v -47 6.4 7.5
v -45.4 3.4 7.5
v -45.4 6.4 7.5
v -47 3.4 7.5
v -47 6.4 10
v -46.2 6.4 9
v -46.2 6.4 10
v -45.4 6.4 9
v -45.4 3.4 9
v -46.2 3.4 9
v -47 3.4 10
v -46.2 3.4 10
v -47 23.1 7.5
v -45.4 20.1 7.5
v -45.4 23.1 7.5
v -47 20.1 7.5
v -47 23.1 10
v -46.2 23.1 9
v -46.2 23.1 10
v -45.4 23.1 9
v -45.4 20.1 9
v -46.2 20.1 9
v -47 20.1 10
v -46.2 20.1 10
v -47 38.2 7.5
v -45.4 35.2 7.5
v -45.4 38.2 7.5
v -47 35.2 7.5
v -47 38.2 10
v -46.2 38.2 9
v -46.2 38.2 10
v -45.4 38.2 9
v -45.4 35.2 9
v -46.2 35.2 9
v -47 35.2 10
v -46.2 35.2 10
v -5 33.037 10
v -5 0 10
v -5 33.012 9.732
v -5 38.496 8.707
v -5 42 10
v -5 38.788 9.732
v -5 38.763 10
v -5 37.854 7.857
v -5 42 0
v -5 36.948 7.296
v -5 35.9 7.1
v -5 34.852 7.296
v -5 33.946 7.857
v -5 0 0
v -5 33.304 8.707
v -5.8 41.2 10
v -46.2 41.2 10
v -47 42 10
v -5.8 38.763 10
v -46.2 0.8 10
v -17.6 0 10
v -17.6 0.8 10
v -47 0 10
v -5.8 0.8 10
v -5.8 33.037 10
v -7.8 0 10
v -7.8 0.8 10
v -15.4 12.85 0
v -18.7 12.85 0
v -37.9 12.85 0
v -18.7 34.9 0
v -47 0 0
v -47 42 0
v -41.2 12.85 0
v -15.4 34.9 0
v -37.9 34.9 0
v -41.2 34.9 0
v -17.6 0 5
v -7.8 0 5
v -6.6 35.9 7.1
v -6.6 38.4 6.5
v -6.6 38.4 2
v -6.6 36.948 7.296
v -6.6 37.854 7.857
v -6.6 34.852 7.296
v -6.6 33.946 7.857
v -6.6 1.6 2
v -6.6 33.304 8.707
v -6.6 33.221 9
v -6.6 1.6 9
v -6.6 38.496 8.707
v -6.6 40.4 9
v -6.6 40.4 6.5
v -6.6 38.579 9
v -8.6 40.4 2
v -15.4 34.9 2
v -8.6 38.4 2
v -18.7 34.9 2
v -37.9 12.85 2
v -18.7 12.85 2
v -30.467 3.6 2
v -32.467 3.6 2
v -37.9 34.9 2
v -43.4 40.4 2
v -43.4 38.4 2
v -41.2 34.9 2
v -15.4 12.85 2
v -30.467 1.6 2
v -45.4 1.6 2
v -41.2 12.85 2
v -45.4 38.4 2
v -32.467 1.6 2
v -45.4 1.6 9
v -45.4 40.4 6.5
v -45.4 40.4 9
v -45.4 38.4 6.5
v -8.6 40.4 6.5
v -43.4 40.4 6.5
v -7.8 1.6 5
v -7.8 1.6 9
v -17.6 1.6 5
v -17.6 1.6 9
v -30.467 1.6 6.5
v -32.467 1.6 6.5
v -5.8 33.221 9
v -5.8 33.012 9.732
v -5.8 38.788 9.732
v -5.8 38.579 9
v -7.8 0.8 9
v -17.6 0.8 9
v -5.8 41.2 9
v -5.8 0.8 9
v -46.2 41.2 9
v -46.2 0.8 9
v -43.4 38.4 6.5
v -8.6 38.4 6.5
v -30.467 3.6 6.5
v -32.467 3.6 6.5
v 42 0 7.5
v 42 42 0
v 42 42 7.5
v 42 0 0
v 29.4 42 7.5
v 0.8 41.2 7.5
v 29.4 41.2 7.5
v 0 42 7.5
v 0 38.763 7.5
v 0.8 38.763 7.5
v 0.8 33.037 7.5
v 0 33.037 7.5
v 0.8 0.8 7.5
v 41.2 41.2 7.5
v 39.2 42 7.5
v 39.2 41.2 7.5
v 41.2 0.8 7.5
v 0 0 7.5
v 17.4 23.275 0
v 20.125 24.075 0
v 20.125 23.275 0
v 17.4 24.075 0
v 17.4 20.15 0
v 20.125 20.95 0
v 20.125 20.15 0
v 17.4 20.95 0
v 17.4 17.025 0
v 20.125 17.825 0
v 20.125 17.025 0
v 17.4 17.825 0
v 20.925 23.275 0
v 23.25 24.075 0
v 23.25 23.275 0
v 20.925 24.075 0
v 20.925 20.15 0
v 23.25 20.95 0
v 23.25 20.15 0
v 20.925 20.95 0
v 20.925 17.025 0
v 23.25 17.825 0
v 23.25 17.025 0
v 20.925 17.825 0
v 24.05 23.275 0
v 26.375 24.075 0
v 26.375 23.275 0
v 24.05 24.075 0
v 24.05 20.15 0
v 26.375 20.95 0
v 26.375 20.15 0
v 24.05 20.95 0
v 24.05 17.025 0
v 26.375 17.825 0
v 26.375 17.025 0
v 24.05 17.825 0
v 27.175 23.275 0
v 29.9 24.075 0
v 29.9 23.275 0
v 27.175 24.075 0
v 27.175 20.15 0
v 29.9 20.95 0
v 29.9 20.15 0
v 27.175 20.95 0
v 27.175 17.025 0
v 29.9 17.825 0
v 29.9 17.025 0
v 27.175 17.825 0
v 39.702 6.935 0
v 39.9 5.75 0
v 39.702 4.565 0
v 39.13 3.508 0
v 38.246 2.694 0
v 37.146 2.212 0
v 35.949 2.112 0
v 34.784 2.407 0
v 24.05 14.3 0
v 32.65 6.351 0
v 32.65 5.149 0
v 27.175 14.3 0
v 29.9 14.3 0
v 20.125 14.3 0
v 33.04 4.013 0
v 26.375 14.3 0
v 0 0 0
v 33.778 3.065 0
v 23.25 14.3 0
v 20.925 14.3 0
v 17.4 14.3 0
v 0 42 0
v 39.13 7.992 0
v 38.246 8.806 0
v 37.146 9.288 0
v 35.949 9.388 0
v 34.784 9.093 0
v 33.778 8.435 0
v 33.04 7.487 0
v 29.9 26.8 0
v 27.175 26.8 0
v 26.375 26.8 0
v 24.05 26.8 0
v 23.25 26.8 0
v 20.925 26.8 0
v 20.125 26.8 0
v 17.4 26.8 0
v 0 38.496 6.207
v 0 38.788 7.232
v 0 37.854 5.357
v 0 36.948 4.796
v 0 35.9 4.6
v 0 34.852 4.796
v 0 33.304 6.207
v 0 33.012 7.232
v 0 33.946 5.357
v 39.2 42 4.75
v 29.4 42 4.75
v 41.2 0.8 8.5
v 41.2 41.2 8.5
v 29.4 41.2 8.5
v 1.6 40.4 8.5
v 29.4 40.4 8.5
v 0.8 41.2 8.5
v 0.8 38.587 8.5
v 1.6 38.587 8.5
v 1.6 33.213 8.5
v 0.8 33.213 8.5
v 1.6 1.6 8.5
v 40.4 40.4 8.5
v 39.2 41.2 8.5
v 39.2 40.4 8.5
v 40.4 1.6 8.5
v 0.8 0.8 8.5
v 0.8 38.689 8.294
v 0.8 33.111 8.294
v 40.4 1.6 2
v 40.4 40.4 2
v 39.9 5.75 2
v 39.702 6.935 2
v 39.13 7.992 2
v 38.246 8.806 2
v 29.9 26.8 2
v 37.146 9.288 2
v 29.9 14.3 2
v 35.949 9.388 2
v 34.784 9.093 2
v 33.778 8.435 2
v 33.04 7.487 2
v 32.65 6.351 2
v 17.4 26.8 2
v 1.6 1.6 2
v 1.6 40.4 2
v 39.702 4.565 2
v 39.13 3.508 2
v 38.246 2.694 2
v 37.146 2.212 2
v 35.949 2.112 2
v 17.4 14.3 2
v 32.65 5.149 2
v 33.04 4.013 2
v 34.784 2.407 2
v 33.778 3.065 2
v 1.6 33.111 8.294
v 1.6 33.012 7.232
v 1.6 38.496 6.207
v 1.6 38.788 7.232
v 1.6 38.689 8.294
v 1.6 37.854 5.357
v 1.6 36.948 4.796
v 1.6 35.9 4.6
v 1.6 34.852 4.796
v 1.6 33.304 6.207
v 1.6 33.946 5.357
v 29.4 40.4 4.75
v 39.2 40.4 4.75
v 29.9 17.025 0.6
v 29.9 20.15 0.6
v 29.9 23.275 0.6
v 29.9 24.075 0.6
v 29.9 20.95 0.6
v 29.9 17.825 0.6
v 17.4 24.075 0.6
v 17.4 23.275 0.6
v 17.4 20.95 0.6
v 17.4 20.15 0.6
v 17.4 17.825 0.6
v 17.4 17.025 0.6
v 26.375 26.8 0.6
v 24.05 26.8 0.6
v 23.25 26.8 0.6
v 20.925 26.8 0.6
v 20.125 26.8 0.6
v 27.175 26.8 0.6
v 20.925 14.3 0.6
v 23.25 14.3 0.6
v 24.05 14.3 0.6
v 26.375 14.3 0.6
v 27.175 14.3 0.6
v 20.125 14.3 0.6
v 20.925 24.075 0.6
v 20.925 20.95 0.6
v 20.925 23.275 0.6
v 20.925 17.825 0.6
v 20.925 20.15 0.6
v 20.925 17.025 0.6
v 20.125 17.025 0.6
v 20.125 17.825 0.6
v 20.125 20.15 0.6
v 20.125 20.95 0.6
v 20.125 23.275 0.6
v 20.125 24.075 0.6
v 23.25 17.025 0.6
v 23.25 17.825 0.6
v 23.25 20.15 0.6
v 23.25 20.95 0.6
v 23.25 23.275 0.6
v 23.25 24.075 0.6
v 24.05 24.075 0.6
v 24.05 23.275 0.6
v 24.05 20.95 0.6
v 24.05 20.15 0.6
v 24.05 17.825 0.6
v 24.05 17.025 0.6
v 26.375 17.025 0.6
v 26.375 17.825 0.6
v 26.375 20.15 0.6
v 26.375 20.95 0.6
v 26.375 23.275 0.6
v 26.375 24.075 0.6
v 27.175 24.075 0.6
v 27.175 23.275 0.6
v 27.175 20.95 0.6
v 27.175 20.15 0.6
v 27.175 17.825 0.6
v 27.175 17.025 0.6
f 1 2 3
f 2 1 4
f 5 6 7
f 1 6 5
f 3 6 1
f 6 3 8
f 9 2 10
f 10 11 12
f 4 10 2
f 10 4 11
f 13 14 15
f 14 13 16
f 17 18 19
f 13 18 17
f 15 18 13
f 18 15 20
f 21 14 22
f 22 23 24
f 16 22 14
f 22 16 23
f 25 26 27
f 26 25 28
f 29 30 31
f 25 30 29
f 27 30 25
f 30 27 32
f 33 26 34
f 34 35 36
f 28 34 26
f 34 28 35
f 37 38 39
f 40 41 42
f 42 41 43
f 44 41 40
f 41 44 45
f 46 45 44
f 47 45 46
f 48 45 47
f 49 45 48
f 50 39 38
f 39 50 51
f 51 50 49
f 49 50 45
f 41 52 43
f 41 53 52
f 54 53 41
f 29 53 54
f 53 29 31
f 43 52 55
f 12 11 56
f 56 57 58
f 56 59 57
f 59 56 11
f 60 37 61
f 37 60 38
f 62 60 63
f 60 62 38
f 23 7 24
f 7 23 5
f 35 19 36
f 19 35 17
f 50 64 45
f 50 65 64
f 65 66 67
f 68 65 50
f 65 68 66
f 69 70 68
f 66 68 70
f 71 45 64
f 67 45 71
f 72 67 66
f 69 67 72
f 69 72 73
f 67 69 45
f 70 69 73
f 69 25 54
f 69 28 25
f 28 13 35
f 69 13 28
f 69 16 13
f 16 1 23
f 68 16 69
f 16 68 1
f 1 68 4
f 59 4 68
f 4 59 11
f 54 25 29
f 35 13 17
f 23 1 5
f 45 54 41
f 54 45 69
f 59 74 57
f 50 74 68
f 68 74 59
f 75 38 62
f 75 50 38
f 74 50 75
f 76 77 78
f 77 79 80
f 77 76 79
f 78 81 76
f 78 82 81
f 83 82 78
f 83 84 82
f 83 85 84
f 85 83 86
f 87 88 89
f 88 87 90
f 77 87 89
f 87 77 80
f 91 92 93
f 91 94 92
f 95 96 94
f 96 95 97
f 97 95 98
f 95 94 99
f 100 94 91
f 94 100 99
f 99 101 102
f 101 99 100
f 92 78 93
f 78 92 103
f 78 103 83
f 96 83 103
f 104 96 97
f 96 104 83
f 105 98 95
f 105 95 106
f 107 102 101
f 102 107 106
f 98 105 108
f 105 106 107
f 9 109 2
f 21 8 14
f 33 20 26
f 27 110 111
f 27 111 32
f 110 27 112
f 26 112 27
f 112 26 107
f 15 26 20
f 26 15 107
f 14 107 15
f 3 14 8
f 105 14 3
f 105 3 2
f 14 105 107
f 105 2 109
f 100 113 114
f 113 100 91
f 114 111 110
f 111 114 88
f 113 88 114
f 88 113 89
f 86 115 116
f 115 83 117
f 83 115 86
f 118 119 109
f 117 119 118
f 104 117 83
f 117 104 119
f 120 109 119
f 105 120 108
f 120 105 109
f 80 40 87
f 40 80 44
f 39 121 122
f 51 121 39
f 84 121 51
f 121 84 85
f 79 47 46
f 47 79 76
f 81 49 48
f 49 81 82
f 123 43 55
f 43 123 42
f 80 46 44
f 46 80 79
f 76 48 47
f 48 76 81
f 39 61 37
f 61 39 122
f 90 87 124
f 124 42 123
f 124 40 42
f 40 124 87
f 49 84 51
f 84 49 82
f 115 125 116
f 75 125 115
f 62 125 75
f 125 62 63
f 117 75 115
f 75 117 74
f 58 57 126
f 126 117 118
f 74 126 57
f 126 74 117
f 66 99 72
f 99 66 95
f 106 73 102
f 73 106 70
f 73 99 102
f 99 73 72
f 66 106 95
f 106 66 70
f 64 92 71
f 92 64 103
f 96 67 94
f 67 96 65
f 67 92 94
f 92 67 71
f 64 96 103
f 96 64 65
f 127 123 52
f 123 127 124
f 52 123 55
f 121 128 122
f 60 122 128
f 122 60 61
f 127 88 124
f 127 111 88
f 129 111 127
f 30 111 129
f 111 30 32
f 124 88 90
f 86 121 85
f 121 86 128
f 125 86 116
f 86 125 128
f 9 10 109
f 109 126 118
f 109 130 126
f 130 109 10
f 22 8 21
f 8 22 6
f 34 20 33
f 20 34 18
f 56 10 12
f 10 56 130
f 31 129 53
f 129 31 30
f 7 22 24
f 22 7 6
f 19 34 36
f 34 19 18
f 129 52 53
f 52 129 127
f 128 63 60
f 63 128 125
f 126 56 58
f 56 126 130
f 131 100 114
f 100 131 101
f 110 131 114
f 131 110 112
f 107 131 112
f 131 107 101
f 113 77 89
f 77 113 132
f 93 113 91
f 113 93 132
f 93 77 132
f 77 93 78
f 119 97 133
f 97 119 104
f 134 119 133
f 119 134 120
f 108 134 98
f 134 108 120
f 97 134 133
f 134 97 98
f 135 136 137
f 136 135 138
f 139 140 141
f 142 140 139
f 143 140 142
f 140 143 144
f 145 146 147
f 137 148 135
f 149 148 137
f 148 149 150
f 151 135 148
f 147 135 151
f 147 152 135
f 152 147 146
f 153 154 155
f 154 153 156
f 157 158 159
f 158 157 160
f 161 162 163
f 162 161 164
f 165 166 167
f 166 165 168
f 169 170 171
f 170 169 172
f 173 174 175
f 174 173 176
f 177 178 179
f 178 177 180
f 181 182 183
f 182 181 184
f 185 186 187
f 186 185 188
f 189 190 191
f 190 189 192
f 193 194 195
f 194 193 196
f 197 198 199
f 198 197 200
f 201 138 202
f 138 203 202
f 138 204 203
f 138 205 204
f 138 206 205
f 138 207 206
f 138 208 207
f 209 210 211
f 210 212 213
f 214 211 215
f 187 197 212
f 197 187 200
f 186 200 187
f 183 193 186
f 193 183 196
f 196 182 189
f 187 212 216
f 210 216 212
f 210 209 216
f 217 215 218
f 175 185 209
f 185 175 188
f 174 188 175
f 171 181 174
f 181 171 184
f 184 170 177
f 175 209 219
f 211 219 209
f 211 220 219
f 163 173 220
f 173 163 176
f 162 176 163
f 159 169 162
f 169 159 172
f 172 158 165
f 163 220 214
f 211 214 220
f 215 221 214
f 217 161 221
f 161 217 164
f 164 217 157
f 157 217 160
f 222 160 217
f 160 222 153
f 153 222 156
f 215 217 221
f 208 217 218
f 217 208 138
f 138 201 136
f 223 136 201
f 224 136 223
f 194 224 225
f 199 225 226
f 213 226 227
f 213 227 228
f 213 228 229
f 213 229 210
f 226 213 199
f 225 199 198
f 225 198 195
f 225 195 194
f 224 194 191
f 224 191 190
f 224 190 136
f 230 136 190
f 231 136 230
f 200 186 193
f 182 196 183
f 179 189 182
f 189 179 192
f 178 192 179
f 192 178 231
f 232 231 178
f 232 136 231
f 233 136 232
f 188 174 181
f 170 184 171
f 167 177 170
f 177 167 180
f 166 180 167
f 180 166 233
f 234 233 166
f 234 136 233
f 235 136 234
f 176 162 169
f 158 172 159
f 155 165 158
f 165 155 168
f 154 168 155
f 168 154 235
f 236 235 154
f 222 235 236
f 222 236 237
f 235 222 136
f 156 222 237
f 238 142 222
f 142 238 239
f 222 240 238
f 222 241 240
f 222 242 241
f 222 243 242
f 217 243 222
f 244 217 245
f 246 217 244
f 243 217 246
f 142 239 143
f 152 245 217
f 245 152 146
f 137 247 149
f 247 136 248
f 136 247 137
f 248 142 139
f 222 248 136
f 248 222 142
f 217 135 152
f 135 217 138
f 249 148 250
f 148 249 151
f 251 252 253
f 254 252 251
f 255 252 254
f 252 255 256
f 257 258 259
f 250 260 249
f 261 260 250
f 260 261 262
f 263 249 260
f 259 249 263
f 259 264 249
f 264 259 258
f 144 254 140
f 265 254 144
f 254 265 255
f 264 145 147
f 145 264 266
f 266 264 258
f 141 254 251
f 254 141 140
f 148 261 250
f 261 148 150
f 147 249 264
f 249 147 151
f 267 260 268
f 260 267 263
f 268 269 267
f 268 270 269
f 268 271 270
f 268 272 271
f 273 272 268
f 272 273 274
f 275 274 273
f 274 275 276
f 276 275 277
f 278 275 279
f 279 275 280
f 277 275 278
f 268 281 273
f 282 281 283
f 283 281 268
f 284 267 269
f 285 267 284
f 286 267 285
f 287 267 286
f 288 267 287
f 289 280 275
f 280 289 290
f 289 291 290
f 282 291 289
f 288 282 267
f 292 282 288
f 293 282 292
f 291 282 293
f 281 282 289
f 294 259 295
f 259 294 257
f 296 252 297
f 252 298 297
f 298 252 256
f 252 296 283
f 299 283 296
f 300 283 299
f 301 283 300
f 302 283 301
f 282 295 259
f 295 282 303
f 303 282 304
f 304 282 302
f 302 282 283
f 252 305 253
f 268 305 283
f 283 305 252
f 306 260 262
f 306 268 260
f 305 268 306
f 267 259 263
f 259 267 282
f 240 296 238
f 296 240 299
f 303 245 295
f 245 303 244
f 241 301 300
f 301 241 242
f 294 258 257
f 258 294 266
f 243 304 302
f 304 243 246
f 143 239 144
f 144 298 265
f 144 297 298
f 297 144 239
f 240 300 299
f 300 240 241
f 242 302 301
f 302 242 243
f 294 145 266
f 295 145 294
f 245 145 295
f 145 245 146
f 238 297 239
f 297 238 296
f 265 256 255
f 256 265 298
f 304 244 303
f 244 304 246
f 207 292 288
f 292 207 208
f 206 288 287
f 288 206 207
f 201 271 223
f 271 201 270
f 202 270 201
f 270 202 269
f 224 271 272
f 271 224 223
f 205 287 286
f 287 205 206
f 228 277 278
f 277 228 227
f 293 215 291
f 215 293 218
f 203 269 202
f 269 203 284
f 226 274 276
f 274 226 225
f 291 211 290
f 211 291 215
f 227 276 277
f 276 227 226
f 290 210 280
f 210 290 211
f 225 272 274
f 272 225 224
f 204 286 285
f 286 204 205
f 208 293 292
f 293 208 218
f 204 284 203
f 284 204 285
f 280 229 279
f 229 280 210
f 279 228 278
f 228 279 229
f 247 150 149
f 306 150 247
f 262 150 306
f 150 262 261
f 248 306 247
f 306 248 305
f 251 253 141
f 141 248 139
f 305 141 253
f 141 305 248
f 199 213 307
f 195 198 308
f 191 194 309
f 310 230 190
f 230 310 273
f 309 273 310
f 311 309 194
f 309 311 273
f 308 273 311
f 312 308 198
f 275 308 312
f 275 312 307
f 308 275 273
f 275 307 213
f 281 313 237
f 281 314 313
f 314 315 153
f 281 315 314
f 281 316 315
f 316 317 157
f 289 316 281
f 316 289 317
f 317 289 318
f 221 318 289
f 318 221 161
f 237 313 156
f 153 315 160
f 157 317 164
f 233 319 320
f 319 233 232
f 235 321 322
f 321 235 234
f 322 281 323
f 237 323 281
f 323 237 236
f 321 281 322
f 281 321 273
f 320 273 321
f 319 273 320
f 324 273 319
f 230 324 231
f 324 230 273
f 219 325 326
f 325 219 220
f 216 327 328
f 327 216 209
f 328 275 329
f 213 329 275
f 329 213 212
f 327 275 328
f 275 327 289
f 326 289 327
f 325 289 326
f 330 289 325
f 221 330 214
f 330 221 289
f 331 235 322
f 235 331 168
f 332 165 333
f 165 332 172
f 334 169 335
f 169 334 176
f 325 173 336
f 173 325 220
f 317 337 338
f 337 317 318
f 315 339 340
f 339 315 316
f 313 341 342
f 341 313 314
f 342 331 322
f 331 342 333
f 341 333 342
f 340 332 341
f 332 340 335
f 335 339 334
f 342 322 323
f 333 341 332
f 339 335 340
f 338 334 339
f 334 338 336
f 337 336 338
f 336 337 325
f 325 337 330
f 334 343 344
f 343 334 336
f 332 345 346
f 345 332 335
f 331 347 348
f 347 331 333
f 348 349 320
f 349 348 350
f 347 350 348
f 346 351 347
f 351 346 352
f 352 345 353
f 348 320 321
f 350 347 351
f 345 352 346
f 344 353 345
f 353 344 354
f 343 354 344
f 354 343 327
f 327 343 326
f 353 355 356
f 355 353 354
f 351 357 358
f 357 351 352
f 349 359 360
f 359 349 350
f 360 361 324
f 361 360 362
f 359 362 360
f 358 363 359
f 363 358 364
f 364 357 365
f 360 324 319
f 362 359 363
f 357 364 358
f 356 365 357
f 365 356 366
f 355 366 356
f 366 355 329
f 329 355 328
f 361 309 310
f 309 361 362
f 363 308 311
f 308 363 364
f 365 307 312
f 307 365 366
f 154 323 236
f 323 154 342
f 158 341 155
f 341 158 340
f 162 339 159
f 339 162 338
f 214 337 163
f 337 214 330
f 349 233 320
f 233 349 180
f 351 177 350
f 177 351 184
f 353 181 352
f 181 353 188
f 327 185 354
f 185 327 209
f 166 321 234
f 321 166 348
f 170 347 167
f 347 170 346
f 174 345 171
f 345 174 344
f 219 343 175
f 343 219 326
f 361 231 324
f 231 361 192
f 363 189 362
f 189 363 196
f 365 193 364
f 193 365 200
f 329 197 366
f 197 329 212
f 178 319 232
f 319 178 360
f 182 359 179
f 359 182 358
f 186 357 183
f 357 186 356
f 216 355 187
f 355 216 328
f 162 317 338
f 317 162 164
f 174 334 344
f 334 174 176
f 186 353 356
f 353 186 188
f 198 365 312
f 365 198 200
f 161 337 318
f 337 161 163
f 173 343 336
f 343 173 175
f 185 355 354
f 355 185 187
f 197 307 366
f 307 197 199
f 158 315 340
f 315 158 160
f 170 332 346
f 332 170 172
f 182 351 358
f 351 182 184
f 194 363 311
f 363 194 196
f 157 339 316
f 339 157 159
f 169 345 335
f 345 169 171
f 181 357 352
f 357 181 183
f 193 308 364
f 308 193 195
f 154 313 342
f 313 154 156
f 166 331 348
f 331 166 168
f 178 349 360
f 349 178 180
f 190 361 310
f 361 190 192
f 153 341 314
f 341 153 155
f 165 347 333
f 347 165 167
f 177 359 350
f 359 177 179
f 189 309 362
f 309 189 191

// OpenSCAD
coverWidth=42;
coverHeight=42;
coverDepth=10;
caseDepth=7.5;

coverBoardWidth=38.8;
coverBoardHeight=38.8;
coverBoardDepth=8;
caseBoardDepth=5.5;
floatStickDepth = 3.5;

powerHoleR = 2.9;
powerHoleShift = 4.5;

usbHoleHeight = 3.8;
usbHoleWidth= 9.8;
usbHoleShift = 11;
usbHoleZShift = 5;
usbCaseHoleShift = 11;
usbCaseHoleZShift = 2.75;

buttonHoleWidth = 3.0;
buttonHoleHeight = 2.0;
buttonHoleShift = [1.8, 18.5, 33.6];
buttonHoleZShift = 2.5;

mikroBUSHeight = 22.05;
mikroBUSWidth = 3.3;
mikroBUSXShift = 4.2;
mikroBUSXShiftAdd = 22.5;
mikroBUSYShift = 5.5;

cameraHoleR = 3.65;
cameraHoleXShift=0.5;
cameraHoleYShift=0.5;

cpuHoleWidth = 12.5;
cpuHoleHeight = 12.5;
cpuHoleX = 10.5;
cpuHoleY = 12.7;

part = "both"; // [cover:cover only,case:case only,both:cover and case]

module obj0x01 () {
}

caseWidth = coverWidth;
caseHeight = coverHeight;
caseBoardWidth = coverBoardWidth;
caseBoardHeight = coverBoardHeight;
usbHoleZShiftLeft = max(coverDepth-usbHoleZShift-usbHoleHeight, 0);
buttonHoleZShiftLeft = max(coverDepth-buttonHoleZShift-buttonHoleHeight, 0);

module cover() {
    union() {
        difference() {
            cube([coverWidth,coverHeight,coverDepth]);
            translate([(coverWidth-coverBoardWidth)/2, (coverHeight-coverBoardHeight)/2, coverDepth-coverBoardDepth]) {
                cube([coverBoardWidth, coverBoardHeight, coverBoardDepth+1]);
            }
            // power hole
            translate([(coverWidth-coverBoardWidth)/2+coverBoardWidth-1, (coverHeight-coverBoardHeight)/2+coverBoardHeight-powerHoleShift, coverDepth]) {
                rotate([0,90,0]) {
                    cylinder(r=powerHoleR, h=(coverWidth-coverBoardWidth)/2+2, $fn=getFN(powerHoleR));
                }
            }
            // usb
            translate([(coverWidth-coverBoardWidth)/2+coverBoardWidth-usbHoleShift,-1,coverDepth-usbHoleZShift]) {
                cube([usbHoleWidth, coverHeight-coverBoardHeight+2, usbHoleHeight+usbHoleZShiftLeft+1]);
            }
            // buttons
            for (i = buttonHoleShift) {
                translate([-1, (coverHeight-coverBoardHeight)/2+i, coverDepth-buttonHoleZShift]) {
                    cube([(coverWidth-coverBoardWidth)/2+2,buttonHoleWidth, buttonHoleHeight+buttonHoleZShiftLeft+1]);
                }
            }
            // mikroBUS
            translate([(coverWidth-coverBoardWidth)/2+mikroBUSXShift, (coverHeight-coverBoardHeight)/2+coverBoardHeight-mikroBUSHeight-mikroBUSYShift, -1]) {
                cube([mikroBUSWidth,mikroBUSHeight, coverDepth-coverBoardDepth+2]);
            }
            translate([(coverWidth-coverBoardWidth)/2+mikroBUSXShift+mikroBUSXShiftAdd, (coverHeight-coverBoardHeight)/2+coverBoardHeight-mikroBUSHeight-mikroBUSYShift, -1]) {
                cube([mikroBUSWidth,mikroBUSHeight, coverDepth-coverBoardDepth+2]);
            }
            // latch
            translate([(coverWidth-coverBoardWidth)/4,(coverHeight-coverBoardHeight)/4,coverDepth-1]) {
                cube([(coverWidth+coverBoardWidth)/2, (coverHeight+coverBoardHeight)/2, 1+1]);
            }
        }
        translate([(coverWidth-coverBoardWidth)/2, (coverHeight-coverBoardHeight)/2+coverBoardHeight-2, 0]) {
            cube([2,2,coverDepth-floatStickDepth]);
        }
        translate([(coverWidth-coverBoardWidth)/2+coverBoardWidth-2, (coverHeight-coverBoardHeight)/2+coverBoardHeight-2, 0]) {
            cube([2,2,coverDepth-floatStickDepth]);
        }
        translate([(coverWidth-coverBoardWidth)/2+coverBoardWidth/3, (coverHeight-coverBoardHeight)/2, 0]) {
            cube([2,2,coverDepth-floatStickDepth]);
        }
    }
}
module case() {
    union() {
        difference() {
            union() {
                cube([caseWidth,caseHeight,caseDepth]);
                // latch
                translate([(caseWidth-caseBoardWidth)/4,(caseHeight-caseBoardHeight)/4,0]) {
                    cube([(caseWidth+caseBoardWidth)/2, (caseHeight+caseBoardHeight)/2, caseDepth+1]);
                }
            }
            translate([(caseWidth-caseBoardWidth)/2, (caseHeight-caseBoardHeight)/2, caseDepth-caseBoardDepth]) {
                cube([caseBoardWidth, caseBoardHeight, caseBoardDepth+2]);
            }
            // power hole
            translate([-1, (caseHeight-caseBoardHeight)/2+caseBoardHeight-powerHoleShift, caseDepth]) {
                rotate([0,90,0]) {
                    cylinder(r=powerHoleR, h=(caseWidth-caseBoardWidth)/2+2, $fn=getFN(powerHoleR));
                }
            }
            // camera hole
            translate([(caseWidth-caseBoardWidth)/2+caseBoardWidth-cameraHoleR-cameraHoleXShift,(caseHeight-caseBoardHeight)/2+cameraHoleR+cameraHoleYShift,-1]) {
                cylinder(r=cameraHoleR, h=caseDepth-caseBoardDepth+2, $fn=getFN(cameraHoleR));
            }
            // usb
            translate([(caseWidth-caseBoardWidth)/2+caseBoardWidth-usbCaseHoleShift,(caseHeight-caseBoardHeight)/2+caseBoardHeight-1,caseDepth-usbCaseHoleZShift]) {
                cube([usbHoleWidth, caseHeight-caseBoardHeight+2, usbHoleHeight]);
            }
            // cpu
            translate([(caseWidth-caseBoardWidth)/2+caseBoardWidth-cpuHoleWidth-cpuHoleX,(caseHeight-caseBoardHeight)/2+cpuHoleY,-1]) {
                cube([cpuHoleWidth, cpuHoleHeight, caseDepth-caseBoardDepth+2]);
            }
        }
        for (i= [cpuHoleWidth/4 : cpuHoleWidth/4 : cpuHoleWidth*4/5]) {
            translate([(caseWidth-caseBoardWidth)/2+caseBoardWidth-cpuHoleWidth-cpuHoleX-0.4+i, (caseHeight-caseBoardHeight)/2+cpuHoleY-0.1, 0]) {
                cube([0.8, cpuHoleHeight+0.2, 0.6]);
            }
        }
        for (i= [cpuHoleHeight/4 : cpuHoleHeight/4 : cpuHoleHeight*4/5]) {
            translate([(caseWidth-caseBoardWidth)/2+caseBoardWidth-cpuHoleWidth-cpuHoleX-0.1, (caseHeight-caseBoardHeight)/2+cpuHoleY-0.4+i, 0]) {
                cube([cpuHoleWidth+0.2, 0.8, 0.6]);
            }
        }
    }    
}

if (part == "cover") {
    cover();
} else if (part == "case") {
    case();
} else {
    translate([-coverWidth-5,0,0]) {
        cover();
    }
    case();
}

/**
 * getFN() - get $fn by computing the r and err.
 *
 * We don't need to set $fn to 100 always. Instead, we calculate
 * the distance between the polygon and the circle. Make sure the
 * maximum distance between the polygon and the circle is less
 * than err.
 *
 * Mathmatical induction as following:
 *  theta = 360/fn/2
 *  err = r - r cos (theta)
 *   =>
 * err = r(1-cos(360/fn/2))
 * err/r = 1-cos(360/fn/2)
 * cos(360/fn/2) = 1-err/r
 * 180/fn = acos(1-err/r)
 * fn = 180.0/acos(1-err/r)
 *
 * @param r the radius
 * @param err the error between the circle and the polygon
 * @return the minimum $fn that can be used. We restrict the return value to be 10 <= $fn <= 100 to make openscad happy.
 */
function getFN(r, err=0.05) = max(min(ceil(180.0/acos(1-err/r)),100),10);
